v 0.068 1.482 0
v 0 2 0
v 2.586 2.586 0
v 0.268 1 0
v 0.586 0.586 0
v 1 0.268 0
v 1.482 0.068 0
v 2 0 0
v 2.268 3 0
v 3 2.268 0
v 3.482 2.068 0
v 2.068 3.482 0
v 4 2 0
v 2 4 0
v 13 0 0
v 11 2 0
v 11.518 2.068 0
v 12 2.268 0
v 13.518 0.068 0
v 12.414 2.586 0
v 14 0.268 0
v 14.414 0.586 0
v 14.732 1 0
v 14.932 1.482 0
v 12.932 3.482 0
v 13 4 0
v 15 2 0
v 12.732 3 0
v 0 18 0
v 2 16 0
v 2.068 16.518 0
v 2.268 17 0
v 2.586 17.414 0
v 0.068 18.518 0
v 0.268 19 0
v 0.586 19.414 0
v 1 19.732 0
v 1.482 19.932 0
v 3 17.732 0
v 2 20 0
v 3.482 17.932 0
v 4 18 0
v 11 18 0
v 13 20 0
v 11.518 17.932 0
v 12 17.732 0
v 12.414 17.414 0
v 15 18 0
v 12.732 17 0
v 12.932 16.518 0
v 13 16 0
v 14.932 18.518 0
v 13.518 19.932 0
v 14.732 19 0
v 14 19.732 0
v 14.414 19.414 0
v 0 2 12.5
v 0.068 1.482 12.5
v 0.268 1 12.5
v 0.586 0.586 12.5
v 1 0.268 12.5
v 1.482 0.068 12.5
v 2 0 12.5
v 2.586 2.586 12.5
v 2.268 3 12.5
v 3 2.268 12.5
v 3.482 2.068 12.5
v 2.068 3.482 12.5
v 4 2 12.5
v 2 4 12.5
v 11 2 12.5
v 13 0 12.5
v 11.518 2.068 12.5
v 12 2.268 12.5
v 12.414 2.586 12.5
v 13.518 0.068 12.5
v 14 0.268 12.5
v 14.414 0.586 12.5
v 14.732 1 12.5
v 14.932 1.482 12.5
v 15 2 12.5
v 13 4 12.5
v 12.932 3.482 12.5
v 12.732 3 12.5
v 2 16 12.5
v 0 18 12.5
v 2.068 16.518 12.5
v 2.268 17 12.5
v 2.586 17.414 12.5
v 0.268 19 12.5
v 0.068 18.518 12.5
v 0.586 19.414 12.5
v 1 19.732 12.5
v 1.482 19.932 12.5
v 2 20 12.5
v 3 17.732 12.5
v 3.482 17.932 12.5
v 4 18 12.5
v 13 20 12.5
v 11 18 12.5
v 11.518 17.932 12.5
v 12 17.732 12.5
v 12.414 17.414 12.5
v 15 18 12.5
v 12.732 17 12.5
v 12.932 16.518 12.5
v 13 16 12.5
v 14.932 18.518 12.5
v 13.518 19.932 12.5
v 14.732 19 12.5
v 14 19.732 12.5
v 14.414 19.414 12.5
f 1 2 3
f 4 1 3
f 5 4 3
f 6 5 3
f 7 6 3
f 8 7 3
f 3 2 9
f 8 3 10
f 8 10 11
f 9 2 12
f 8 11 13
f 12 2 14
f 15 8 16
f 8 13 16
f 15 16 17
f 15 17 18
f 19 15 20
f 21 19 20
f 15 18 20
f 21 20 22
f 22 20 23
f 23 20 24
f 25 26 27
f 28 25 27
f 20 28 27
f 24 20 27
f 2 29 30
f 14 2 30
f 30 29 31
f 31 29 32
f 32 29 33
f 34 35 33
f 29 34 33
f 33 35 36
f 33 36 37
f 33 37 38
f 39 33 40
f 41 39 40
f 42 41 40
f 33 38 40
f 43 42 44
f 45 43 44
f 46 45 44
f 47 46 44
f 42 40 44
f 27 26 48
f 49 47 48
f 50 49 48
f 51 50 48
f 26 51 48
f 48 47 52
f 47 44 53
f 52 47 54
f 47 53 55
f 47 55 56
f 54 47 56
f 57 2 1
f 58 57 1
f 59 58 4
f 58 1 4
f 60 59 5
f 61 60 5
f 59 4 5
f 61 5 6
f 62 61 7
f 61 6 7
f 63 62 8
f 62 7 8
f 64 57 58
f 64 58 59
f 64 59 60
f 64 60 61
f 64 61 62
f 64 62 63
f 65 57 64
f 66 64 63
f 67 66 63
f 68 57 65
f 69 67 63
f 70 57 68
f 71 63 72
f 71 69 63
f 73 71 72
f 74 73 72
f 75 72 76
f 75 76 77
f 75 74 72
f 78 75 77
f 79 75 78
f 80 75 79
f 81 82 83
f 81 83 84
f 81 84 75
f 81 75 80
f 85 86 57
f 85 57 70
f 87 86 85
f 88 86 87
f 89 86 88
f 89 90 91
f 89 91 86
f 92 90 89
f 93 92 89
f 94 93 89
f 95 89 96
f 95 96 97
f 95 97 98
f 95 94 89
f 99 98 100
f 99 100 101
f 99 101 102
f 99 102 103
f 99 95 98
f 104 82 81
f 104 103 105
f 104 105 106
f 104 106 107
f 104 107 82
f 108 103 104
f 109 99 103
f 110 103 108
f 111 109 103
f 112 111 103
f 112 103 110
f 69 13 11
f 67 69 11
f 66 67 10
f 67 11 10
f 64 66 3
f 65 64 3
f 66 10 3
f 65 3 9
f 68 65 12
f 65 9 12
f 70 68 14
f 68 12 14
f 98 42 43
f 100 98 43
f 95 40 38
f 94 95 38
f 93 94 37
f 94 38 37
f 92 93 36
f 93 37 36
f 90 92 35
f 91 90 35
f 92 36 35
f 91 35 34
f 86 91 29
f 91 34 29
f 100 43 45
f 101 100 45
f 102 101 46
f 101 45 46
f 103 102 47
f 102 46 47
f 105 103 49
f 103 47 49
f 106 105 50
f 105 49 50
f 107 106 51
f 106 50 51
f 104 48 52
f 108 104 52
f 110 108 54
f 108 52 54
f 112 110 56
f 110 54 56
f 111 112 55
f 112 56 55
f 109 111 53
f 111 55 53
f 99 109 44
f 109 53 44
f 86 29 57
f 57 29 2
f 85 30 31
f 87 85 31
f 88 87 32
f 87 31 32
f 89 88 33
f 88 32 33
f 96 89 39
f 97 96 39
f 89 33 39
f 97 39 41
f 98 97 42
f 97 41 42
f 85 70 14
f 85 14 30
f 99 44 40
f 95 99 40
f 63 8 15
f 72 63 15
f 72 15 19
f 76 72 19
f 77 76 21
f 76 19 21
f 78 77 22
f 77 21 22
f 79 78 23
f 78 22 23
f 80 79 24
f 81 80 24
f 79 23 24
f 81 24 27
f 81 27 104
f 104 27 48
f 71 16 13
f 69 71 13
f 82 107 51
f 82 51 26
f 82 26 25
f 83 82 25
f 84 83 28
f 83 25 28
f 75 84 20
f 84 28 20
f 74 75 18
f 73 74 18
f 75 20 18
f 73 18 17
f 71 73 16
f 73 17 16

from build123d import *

# Parameters (mm, degrees)
F1_DEPTH = 12.5


with BuildPart() as f1:
    # F0 (on Top) → F1 (new body)
    with BuildSketch(Plane.XY):
        with BuildLine():
            ThreePointArc((0, 2), (0.585786, 0.585786), (2, 0))
            Line((2, 0), (13, 0))
            ThreePointArc((13, 0), (14.414214, 0.585786), (15, 2))
            Line((15, 2), (15, 18))
            ThreePointArc((15, 18), (14.414214, 19.414214), (13, 20))
            Line((13, 20), (2, 20))
            ThreePointArc((2, 20), (0.585786, 19.414214), (0, 18))
            Line((0, 18), (0, 2))
        make_face()
        with BuildLine():
            ThreePointArc((2, 16), (2.585786, 17.414214), (4, 18))
            Line((4, 18), (11, 18))
            ThreePointArc((11, 18), (12.414214, 17.414214), (13, 16))
            Line((13, 16), (13, 4))
            ThreePointArc((13, 4), (12.414214, 2.585786), (11, 2))
            Line((11, 2), (4, 2))
            ThreePointArc((4, 2), (2.585786, 2.585786), (2, 4))
            Line((2, 4), (2, 16))
        make_face(mode=Mode.SUBTRACT)
    extrude(amount=F1_DEPTH)


solid = f1.part
